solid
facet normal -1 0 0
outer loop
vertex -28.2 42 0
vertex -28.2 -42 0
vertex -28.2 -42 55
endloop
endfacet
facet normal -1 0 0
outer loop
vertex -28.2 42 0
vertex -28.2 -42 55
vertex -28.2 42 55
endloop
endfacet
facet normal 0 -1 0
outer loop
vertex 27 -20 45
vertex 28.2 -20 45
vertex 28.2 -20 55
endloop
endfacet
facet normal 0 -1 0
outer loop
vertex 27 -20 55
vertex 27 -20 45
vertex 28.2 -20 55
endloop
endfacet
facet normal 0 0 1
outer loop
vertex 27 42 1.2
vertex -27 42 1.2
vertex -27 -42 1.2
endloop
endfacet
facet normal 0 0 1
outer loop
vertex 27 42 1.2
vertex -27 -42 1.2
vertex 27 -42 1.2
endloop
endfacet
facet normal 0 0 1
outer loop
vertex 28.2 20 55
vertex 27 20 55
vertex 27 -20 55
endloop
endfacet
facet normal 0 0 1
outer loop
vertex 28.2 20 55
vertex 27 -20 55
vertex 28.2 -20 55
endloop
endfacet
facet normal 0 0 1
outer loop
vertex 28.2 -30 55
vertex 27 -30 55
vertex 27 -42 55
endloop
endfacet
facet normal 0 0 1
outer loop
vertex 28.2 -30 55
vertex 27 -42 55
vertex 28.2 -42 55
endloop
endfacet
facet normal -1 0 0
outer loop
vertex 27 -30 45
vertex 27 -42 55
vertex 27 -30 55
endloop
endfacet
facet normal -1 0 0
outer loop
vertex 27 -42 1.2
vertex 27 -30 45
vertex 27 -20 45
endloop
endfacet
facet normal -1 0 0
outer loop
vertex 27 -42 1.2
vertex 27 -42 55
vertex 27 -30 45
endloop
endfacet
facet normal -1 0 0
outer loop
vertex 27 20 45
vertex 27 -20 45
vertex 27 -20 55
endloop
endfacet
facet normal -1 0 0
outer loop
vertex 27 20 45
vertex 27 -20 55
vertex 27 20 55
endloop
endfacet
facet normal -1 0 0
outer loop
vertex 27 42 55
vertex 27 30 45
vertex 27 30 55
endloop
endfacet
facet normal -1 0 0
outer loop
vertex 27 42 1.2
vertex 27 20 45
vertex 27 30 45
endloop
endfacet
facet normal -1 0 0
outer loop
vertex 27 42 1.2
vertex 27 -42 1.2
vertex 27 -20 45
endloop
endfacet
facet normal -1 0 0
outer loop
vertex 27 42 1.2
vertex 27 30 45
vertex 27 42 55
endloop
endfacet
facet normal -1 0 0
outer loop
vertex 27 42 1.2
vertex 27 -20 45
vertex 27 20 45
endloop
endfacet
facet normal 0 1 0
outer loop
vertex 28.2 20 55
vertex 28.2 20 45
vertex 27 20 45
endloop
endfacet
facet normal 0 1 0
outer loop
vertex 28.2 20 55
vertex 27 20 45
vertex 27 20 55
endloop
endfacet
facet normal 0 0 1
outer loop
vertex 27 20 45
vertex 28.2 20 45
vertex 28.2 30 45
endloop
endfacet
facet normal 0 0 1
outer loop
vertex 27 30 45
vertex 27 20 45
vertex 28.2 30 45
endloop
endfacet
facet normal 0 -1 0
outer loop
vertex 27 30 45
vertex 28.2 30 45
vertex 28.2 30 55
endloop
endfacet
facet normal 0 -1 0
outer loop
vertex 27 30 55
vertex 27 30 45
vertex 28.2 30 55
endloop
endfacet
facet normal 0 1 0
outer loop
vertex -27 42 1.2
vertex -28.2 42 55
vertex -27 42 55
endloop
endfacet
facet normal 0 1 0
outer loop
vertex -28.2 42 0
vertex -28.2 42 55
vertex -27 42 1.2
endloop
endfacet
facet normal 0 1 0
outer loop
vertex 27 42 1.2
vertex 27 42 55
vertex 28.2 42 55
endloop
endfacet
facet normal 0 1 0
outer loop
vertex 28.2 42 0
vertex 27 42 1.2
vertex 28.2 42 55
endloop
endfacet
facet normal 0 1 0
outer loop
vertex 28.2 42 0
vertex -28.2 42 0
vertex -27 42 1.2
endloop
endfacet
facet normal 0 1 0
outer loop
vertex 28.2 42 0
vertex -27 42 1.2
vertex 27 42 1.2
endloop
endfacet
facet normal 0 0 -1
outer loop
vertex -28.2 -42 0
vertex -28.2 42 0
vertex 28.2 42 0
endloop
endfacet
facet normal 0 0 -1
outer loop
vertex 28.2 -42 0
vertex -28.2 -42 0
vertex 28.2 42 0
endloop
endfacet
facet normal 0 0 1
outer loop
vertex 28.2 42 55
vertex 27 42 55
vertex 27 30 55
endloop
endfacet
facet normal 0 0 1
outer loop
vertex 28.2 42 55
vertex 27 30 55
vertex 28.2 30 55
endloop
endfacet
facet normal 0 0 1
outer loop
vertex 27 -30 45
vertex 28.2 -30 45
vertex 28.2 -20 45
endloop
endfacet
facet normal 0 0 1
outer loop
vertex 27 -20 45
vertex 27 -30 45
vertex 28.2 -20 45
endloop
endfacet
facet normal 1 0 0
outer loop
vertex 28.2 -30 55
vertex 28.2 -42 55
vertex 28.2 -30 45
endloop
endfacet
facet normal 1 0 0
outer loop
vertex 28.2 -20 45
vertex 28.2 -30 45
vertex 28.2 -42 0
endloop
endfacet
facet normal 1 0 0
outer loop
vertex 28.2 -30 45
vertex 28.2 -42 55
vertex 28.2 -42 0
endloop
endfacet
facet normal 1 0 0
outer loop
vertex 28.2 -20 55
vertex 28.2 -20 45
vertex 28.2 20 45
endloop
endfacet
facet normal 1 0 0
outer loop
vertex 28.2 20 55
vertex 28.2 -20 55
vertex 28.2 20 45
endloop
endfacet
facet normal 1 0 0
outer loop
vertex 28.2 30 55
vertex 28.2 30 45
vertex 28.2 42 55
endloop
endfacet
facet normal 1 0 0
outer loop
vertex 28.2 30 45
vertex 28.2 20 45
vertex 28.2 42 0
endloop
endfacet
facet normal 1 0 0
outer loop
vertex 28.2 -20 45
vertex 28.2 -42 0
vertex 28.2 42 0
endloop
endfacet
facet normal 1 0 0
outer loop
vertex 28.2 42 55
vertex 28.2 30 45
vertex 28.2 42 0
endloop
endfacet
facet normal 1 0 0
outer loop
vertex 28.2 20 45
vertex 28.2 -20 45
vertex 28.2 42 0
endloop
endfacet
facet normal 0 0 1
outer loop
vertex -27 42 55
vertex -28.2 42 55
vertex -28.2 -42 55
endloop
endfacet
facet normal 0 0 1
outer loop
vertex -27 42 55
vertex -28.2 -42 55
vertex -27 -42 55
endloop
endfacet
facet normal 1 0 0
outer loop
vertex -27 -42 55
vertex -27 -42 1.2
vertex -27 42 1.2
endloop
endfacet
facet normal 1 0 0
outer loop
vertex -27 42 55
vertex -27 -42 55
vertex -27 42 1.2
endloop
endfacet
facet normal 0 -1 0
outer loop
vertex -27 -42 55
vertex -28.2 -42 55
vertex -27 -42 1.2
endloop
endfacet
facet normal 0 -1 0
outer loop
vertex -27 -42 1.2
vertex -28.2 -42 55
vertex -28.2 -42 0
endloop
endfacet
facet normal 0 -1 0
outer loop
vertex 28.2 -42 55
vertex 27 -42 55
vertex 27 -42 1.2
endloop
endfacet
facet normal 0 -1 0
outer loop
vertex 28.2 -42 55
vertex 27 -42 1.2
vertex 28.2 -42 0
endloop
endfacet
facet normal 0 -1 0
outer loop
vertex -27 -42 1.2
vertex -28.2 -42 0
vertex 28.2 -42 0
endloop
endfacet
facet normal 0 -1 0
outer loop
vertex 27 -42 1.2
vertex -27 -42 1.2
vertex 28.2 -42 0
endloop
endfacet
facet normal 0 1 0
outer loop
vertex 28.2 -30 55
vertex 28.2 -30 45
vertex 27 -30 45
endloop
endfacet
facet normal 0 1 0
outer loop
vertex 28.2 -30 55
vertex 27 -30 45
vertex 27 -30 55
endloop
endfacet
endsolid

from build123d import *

# Parameters (mm, degrees)
F0_W     = 54
F0_H     = 84
F1_DEPTH = 1.2
F0_W_2   = 1.2
F2_DEPTH = 55
F3_W     = 10
F3_H     = 10
F4_DEPTH = 25


with BuildPart() as f1:
    # F0 (on Top) → F1 (new body)
    with BuildSketch(Plane.XY):
        Rectangle(F0_W, F0_H)
    extrude(amount=F1_DEPTH)

    # F0 (on Top) → F2 (join)
    with BuildSketch(Plane.XY):
        with Locations((-27.6, 0)):
            Rectangle(F0_W_2, F0_H)
        with Locations((27.6, 0)):
            Rectangle(F0_W_2, F0_H)
    extrude(amount=F2_DEPTH)

    # F3 (on face) → F4 (cut)
    with BuildSketch(Plane.YZ.offset(28.2)):
        with Locations((-25, 50)):
            Rectangle(F3_W, F3_H)
        with Locations((25, 50)):
            Rectangle(F3_W, F3_H)
    extrude(amount=-F4_DEPTH, mode=Mode.SUBTRACT)


solid = f1.part
